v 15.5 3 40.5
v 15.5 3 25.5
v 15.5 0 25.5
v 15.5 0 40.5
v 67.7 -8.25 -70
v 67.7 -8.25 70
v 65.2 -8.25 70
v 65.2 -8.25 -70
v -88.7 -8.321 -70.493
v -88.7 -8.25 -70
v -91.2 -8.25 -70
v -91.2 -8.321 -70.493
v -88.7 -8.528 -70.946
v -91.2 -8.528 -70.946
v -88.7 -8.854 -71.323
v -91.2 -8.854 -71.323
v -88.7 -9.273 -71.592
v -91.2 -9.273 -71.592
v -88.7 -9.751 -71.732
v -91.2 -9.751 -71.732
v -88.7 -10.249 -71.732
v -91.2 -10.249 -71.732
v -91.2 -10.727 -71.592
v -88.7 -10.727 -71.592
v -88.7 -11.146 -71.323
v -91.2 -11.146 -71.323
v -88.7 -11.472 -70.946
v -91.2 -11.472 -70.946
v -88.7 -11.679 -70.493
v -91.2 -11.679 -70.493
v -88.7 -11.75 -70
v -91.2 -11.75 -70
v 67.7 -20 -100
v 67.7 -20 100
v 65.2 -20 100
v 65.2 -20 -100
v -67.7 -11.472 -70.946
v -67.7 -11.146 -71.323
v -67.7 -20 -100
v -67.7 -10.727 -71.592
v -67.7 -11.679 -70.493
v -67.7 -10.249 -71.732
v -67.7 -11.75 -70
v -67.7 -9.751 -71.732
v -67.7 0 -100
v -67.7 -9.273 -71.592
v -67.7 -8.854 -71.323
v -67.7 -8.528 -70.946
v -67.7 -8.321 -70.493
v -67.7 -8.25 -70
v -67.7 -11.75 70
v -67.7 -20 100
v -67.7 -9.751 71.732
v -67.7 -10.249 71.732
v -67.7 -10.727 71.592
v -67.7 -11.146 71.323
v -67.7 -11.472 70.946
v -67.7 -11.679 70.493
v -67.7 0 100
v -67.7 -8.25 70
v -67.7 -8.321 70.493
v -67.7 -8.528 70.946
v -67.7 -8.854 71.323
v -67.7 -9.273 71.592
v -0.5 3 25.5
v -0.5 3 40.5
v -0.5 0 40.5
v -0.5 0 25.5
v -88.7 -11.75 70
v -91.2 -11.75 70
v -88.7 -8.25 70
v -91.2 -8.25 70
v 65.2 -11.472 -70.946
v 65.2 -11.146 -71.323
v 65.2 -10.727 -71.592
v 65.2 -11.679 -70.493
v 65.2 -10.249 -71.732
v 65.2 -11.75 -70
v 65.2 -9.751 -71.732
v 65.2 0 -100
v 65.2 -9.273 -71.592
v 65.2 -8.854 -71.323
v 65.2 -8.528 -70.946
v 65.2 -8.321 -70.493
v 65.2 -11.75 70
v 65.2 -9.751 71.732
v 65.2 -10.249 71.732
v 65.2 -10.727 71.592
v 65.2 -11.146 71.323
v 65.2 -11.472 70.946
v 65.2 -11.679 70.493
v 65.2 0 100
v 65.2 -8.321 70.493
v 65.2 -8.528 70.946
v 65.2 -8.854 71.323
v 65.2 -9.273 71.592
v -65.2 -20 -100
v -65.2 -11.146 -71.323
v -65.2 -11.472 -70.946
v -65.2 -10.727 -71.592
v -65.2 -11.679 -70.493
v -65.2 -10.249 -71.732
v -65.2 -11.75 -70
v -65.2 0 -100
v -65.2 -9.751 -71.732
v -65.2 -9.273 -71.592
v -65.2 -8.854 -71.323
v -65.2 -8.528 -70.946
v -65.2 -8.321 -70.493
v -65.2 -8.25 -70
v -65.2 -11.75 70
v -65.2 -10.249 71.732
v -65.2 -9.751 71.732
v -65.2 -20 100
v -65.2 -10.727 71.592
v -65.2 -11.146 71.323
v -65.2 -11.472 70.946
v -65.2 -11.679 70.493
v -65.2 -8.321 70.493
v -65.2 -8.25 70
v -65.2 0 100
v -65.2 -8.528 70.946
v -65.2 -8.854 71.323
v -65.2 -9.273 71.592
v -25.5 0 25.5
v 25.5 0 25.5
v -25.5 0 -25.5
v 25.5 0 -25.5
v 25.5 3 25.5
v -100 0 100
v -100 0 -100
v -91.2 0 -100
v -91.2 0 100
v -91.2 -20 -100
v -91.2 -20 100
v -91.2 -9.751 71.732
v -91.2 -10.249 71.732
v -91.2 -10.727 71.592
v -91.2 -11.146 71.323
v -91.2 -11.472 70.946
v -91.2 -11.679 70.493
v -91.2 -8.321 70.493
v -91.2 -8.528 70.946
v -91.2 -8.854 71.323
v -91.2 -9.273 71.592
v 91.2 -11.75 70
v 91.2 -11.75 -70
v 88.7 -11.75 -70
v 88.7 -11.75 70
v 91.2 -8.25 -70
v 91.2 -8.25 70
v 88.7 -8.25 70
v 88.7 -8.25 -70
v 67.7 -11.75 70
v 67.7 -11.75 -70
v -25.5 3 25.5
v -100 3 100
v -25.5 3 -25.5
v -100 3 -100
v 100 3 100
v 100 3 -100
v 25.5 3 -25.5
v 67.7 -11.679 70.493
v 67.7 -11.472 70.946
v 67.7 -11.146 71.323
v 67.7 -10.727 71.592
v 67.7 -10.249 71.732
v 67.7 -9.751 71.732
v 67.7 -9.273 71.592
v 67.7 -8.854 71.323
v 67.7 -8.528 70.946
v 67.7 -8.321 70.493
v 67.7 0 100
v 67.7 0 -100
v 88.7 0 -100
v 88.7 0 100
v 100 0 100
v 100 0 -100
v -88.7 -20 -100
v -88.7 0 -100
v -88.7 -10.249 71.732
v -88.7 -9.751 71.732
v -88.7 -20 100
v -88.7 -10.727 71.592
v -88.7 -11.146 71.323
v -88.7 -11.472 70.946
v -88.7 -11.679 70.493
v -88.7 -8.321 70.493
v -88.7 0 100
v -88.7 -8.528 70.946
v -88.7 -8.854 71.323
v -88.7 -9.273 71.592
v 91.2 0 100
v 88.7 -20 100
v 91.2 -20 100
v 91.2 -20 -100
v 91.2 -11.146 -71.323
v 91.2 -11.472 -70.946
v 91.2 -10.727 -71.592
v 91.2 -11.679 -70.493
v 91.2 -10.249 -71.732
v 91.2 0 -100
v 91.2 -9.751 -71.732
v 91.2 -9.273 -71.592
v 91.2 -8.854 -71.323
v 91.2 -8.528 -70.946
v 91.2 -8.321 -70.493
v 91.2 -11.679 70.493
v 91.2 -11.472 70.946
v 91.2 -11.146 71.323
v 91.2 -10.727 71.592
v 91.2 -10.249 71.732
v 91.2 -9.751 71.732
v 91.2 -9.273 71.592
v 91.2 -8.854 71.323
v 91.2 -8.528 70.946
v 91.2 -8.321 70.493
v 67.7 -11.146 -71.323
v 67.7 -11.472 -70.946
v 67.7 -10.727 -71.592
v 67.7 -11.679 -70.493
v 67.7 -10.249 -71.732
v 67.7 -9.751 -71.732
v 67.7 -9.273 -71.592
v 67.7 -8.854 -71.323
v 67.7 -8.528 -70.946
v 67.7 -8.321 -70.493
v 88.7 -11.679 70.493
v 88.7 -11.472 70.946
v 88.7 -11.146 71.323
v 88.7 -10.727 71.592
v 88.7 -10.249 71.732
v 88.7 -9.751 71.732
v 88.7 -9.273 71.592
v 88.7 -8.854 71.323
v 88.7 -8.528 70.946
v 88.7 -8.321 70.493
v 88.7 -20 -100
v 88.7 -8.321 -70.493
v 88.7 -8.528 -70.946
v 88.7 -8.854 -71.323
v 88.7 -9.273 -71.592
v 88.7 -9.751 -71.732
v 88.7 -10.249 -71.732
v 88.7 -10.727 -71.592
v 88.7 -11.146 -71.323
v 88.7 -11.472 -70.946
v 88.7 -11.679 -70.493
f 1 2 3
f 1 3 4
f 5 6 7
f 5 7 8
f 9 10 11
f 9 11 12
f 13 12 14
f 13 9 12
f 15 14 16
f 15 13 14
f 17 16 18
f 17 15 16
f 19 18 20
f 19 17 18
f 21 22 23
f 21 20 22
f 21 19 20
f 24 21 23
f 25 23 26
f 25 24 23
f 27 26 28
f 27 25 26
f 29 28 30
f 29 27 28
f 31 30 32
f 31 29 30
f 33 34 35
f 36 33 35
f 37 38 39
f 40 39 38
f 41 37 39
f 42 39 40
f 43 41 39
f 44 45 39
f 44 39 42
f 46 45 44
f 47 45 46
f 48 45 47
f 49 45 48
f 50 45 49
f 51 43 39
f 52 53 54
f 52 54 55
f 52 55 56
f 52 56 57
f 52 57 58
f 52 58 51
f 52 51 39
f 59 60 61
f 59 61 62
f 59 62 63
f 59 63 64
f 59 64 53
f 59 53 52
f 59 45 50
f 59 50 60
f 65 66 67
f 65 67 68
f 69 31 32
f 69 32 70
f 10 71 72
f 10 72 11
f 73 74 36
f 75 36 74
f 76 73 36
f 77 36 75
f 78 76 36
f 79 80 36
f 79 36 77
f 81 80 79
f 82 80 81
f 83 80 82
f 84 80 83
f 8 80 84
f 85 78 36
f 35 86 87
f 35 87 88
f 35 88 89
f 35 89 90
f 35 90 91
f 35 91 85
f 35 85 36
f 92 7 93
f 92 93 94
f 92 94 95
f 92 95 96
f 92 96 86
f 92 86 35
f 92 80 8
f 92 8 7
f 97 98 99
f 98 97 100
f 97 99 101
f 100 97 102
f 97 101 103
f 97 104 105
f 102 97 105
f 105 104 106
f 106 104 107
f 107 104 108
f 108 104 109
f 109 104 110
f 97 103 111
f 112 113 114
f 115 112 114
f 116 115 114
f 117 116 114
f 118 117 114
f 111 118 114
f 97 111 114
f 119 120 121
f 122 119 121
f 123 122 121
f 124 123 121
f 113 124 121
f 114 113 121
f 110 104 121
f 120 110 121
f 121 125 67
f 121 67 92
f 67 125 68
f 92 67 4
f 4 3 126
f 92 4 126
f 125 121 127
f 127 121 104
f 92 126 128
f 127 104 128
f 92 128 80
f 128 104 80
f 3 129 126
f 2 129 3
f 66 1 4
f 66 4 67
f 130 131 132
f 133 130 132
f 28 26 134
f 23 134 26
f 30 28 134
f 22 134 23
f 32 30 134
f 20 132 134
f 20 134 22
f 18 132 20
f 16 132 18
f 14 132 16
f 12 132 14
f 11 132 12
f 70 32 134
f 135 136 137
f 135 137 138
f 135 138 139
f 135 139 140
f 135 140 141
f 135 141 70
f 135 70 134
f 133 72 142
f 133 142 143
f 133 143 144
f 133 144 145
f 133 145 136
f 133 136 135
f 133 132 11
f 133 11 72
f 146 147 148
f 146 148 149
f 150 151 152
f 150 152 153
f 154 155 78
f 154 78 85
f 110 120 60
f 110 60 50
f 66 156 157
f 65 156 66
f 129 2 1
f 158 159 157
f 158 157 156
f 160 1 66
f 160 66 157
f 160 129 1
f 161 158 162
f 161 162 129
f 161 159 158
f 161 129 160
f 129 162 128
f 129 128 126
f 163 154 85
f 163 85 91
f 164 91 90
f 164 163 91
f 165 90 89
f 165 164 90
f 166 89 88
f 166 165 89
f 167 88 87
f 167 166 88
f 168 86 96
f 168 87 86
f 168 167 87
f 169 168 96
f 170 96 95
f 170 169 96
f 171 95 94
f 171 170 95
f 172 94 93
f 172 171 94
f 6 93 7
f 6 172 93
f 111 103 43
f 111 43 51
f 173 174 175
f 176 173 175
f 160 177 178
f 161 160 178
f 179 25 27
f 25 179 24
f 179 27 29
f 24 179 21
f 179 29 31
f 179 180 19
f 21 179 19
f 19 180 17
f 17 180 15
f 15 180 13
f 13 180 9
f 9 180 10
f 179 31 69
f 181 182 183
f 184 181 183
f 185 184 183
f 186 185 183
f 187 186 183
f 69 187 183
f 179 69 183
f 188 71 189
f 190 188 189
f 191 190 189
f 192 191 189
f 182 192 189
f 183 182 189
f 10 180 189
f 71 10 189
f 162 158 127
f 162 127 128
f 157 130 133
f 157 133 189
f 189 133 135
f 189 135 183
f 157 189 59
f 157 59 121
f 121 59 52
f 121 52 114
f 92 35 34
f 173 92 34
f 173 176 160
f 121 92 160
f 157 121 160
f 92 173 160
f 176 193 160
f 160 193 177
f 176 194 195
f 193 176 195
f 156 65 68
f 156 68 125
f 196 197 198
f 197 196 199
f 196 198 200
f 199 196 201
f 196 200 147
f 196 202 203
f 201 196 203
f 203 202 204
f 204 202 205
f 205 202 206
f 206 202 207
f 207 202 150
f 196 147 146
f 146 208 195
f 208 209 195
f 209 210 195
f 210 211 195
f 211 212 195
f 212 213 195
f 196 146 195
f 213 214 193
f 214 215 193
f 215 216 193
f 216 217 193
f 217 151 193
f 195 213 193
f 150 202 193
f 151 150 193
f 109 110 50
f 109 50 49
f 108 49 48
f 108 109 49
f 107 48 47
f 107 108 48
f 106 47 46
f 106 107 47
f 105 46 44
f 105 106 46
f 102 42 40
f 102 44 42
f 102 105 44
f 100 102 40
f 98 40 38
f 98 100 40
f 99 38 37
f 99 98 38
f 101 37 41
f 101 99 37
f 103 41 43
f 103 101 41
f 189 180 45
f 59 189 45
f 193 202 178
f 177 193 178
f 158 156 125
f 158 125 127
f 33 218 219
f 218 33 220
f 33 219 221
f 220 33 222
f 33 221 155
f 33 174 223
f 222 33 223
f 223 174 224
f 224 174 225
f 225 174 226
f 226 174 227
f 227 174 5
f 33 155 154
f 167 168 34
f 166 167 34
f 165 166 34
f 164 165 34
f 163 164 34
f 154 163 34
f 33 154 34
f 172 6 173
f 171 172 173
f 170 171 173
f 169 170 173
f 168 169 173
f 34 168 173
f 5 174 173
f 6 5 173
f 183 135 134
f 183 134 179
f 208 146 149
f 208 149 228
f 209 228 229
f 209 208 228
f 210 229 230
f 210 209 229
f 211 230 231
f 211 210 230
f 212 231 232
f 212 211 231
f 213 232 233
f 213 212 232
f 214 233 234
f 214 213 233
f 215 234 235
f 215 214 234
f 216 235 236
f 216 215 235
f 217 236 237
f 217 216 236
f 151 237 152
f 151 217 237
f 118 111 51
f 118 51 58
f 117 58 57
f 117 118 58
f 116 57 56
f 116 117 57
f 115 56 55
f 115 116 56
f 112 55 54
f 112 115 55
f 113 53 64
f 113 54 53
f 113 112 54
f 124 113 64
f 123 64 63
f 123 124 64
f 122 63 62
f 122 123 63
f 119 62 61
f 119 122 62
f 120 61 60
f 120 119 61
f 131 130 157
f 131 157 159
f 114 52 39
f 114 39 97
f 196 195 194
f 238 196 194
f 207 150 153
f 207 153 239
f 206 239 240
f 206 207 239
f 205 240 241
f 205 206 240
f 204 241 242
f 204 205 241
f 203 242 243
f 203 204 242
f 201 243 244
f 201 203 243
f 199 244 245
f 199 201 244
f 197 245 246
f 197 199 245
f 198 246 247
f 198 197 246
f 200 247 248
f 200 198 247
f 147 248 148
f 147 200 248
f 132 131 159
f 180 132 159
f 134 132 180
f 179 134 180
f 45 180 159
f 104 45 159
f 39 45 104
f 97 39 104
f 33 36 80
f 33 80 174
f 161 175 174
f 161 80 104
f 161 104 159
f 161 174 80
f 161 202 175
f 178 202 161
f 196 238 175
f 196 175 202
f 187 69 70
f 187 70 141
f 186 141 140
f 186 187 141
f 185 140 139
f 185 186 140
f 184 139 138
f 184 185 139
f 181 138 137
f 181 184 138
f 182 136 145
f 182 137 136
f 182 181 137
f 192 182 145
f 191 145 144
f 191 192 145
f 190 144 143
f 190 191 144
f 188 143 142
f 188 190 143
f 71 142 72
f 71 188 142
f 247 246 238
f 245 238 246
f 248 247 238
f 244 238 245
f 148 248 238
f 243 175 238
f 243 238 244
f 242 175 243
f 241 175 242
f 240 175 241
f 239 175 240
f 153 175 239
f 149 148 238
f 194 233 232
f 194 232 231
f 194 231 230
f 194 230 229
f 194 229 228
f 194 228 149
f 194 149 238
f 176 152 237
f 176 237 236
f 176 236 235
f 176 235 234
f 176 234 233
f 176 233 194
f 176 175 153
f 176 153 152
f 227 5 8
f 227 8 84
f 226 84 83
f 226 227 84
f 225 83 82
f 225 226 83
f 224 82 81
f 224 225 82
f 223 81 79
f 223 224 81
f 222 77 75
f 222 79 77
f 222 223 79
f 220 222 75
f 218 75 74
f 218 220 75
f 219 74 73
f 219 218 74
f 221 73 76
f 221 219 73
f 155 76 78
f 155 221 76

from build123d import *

# Parameters (mm, degrees)
SKETCH_1_W          = 200
SKETCH_1_H          = 200
EXTRUDE_1_DEPTH     = 3
SKETCH_2_W          = 2.5
SKETCH_2_H          = 200
EXTRUDE_2_DEPTH     = 20
CUT_EXTRUDE_2_DEPTH = 217.696654335
CUT_EXTRUDE_3_DEPTH = 10


with BuildPart() as part:
    # 草图1 → 凸台-拉伸1 (new body)
    with BuildSketch(Plane(origin=(0, 0, 0), x_dir=(1, 0, 0), z_dir=(0, 1, 0))):
        Rectangle(SKETCH_1_W, SKETCH_1_H)
    extrude(amount=EXTRUDE_1_DEPTH)

    # 草图2 → 凸台-拉伸2 (add)
    with BuildSketch(Plane.XZ):
        with Locations((-66.45, 0)):
            Rectangle(SKETCH_2_W, SKETCH_2_H)
        with Locations((-89.95, 0)):
            Rectangle(SKETCH_2_W, SKETCH_2_H)
    extrude_2 = extrude(amount=EXTRUDE_2_DEPTH)

    # 镜向1: 凸台-拉伸2 across plane
    add(extrude_2.mirror(Plane(origin=(0, 0, 0), x_dir=(0, 0, 1), z_dir=(1, 0, 0))))

    # 草图5 → 切除-拉伸2 (cut, through all)
    with BuildSketch(Plane(origin=(91.2, 0, 0), x_dir=(0, 0, -1), z_dir=(1, 0, 0))):
        with BuildLine():
            Line((-70, -8.25), (70, -8.25))
            ThreePointArc((70, -8.25), (71.75, -10), (70, -11.75))
            Line((70, -11.75), (-70, -11.75))
            ThreePointArc((-70, -11.75), (-71.75, -10), (-70, -8.25))
        make_face()
    extrude(amount=-CUT_EXTRUDE_2_DEPTH, mode=Mode.SUBTRACT)

    # 草图4 → 切除-拉伸3 (cut)
    with BuildSketch(Plane(origin=(0, 3, 0), x_dir=(1, 0, 0), z_dir=(0, 1, 0))):
        Polygon((15.5, -25.5), (15.5, -40.5), (-0.5, -40.5), (-0.5, -25.5), (-25.5, -25.5), (-25.5, 25.5), (25.5, 25.5), (25.5, -25.5), align=None)
    extrude(amount=-CUT_EXTRUDE_3_DEPTH, mode=Mode.SUBTRACT)


solid = part.part
